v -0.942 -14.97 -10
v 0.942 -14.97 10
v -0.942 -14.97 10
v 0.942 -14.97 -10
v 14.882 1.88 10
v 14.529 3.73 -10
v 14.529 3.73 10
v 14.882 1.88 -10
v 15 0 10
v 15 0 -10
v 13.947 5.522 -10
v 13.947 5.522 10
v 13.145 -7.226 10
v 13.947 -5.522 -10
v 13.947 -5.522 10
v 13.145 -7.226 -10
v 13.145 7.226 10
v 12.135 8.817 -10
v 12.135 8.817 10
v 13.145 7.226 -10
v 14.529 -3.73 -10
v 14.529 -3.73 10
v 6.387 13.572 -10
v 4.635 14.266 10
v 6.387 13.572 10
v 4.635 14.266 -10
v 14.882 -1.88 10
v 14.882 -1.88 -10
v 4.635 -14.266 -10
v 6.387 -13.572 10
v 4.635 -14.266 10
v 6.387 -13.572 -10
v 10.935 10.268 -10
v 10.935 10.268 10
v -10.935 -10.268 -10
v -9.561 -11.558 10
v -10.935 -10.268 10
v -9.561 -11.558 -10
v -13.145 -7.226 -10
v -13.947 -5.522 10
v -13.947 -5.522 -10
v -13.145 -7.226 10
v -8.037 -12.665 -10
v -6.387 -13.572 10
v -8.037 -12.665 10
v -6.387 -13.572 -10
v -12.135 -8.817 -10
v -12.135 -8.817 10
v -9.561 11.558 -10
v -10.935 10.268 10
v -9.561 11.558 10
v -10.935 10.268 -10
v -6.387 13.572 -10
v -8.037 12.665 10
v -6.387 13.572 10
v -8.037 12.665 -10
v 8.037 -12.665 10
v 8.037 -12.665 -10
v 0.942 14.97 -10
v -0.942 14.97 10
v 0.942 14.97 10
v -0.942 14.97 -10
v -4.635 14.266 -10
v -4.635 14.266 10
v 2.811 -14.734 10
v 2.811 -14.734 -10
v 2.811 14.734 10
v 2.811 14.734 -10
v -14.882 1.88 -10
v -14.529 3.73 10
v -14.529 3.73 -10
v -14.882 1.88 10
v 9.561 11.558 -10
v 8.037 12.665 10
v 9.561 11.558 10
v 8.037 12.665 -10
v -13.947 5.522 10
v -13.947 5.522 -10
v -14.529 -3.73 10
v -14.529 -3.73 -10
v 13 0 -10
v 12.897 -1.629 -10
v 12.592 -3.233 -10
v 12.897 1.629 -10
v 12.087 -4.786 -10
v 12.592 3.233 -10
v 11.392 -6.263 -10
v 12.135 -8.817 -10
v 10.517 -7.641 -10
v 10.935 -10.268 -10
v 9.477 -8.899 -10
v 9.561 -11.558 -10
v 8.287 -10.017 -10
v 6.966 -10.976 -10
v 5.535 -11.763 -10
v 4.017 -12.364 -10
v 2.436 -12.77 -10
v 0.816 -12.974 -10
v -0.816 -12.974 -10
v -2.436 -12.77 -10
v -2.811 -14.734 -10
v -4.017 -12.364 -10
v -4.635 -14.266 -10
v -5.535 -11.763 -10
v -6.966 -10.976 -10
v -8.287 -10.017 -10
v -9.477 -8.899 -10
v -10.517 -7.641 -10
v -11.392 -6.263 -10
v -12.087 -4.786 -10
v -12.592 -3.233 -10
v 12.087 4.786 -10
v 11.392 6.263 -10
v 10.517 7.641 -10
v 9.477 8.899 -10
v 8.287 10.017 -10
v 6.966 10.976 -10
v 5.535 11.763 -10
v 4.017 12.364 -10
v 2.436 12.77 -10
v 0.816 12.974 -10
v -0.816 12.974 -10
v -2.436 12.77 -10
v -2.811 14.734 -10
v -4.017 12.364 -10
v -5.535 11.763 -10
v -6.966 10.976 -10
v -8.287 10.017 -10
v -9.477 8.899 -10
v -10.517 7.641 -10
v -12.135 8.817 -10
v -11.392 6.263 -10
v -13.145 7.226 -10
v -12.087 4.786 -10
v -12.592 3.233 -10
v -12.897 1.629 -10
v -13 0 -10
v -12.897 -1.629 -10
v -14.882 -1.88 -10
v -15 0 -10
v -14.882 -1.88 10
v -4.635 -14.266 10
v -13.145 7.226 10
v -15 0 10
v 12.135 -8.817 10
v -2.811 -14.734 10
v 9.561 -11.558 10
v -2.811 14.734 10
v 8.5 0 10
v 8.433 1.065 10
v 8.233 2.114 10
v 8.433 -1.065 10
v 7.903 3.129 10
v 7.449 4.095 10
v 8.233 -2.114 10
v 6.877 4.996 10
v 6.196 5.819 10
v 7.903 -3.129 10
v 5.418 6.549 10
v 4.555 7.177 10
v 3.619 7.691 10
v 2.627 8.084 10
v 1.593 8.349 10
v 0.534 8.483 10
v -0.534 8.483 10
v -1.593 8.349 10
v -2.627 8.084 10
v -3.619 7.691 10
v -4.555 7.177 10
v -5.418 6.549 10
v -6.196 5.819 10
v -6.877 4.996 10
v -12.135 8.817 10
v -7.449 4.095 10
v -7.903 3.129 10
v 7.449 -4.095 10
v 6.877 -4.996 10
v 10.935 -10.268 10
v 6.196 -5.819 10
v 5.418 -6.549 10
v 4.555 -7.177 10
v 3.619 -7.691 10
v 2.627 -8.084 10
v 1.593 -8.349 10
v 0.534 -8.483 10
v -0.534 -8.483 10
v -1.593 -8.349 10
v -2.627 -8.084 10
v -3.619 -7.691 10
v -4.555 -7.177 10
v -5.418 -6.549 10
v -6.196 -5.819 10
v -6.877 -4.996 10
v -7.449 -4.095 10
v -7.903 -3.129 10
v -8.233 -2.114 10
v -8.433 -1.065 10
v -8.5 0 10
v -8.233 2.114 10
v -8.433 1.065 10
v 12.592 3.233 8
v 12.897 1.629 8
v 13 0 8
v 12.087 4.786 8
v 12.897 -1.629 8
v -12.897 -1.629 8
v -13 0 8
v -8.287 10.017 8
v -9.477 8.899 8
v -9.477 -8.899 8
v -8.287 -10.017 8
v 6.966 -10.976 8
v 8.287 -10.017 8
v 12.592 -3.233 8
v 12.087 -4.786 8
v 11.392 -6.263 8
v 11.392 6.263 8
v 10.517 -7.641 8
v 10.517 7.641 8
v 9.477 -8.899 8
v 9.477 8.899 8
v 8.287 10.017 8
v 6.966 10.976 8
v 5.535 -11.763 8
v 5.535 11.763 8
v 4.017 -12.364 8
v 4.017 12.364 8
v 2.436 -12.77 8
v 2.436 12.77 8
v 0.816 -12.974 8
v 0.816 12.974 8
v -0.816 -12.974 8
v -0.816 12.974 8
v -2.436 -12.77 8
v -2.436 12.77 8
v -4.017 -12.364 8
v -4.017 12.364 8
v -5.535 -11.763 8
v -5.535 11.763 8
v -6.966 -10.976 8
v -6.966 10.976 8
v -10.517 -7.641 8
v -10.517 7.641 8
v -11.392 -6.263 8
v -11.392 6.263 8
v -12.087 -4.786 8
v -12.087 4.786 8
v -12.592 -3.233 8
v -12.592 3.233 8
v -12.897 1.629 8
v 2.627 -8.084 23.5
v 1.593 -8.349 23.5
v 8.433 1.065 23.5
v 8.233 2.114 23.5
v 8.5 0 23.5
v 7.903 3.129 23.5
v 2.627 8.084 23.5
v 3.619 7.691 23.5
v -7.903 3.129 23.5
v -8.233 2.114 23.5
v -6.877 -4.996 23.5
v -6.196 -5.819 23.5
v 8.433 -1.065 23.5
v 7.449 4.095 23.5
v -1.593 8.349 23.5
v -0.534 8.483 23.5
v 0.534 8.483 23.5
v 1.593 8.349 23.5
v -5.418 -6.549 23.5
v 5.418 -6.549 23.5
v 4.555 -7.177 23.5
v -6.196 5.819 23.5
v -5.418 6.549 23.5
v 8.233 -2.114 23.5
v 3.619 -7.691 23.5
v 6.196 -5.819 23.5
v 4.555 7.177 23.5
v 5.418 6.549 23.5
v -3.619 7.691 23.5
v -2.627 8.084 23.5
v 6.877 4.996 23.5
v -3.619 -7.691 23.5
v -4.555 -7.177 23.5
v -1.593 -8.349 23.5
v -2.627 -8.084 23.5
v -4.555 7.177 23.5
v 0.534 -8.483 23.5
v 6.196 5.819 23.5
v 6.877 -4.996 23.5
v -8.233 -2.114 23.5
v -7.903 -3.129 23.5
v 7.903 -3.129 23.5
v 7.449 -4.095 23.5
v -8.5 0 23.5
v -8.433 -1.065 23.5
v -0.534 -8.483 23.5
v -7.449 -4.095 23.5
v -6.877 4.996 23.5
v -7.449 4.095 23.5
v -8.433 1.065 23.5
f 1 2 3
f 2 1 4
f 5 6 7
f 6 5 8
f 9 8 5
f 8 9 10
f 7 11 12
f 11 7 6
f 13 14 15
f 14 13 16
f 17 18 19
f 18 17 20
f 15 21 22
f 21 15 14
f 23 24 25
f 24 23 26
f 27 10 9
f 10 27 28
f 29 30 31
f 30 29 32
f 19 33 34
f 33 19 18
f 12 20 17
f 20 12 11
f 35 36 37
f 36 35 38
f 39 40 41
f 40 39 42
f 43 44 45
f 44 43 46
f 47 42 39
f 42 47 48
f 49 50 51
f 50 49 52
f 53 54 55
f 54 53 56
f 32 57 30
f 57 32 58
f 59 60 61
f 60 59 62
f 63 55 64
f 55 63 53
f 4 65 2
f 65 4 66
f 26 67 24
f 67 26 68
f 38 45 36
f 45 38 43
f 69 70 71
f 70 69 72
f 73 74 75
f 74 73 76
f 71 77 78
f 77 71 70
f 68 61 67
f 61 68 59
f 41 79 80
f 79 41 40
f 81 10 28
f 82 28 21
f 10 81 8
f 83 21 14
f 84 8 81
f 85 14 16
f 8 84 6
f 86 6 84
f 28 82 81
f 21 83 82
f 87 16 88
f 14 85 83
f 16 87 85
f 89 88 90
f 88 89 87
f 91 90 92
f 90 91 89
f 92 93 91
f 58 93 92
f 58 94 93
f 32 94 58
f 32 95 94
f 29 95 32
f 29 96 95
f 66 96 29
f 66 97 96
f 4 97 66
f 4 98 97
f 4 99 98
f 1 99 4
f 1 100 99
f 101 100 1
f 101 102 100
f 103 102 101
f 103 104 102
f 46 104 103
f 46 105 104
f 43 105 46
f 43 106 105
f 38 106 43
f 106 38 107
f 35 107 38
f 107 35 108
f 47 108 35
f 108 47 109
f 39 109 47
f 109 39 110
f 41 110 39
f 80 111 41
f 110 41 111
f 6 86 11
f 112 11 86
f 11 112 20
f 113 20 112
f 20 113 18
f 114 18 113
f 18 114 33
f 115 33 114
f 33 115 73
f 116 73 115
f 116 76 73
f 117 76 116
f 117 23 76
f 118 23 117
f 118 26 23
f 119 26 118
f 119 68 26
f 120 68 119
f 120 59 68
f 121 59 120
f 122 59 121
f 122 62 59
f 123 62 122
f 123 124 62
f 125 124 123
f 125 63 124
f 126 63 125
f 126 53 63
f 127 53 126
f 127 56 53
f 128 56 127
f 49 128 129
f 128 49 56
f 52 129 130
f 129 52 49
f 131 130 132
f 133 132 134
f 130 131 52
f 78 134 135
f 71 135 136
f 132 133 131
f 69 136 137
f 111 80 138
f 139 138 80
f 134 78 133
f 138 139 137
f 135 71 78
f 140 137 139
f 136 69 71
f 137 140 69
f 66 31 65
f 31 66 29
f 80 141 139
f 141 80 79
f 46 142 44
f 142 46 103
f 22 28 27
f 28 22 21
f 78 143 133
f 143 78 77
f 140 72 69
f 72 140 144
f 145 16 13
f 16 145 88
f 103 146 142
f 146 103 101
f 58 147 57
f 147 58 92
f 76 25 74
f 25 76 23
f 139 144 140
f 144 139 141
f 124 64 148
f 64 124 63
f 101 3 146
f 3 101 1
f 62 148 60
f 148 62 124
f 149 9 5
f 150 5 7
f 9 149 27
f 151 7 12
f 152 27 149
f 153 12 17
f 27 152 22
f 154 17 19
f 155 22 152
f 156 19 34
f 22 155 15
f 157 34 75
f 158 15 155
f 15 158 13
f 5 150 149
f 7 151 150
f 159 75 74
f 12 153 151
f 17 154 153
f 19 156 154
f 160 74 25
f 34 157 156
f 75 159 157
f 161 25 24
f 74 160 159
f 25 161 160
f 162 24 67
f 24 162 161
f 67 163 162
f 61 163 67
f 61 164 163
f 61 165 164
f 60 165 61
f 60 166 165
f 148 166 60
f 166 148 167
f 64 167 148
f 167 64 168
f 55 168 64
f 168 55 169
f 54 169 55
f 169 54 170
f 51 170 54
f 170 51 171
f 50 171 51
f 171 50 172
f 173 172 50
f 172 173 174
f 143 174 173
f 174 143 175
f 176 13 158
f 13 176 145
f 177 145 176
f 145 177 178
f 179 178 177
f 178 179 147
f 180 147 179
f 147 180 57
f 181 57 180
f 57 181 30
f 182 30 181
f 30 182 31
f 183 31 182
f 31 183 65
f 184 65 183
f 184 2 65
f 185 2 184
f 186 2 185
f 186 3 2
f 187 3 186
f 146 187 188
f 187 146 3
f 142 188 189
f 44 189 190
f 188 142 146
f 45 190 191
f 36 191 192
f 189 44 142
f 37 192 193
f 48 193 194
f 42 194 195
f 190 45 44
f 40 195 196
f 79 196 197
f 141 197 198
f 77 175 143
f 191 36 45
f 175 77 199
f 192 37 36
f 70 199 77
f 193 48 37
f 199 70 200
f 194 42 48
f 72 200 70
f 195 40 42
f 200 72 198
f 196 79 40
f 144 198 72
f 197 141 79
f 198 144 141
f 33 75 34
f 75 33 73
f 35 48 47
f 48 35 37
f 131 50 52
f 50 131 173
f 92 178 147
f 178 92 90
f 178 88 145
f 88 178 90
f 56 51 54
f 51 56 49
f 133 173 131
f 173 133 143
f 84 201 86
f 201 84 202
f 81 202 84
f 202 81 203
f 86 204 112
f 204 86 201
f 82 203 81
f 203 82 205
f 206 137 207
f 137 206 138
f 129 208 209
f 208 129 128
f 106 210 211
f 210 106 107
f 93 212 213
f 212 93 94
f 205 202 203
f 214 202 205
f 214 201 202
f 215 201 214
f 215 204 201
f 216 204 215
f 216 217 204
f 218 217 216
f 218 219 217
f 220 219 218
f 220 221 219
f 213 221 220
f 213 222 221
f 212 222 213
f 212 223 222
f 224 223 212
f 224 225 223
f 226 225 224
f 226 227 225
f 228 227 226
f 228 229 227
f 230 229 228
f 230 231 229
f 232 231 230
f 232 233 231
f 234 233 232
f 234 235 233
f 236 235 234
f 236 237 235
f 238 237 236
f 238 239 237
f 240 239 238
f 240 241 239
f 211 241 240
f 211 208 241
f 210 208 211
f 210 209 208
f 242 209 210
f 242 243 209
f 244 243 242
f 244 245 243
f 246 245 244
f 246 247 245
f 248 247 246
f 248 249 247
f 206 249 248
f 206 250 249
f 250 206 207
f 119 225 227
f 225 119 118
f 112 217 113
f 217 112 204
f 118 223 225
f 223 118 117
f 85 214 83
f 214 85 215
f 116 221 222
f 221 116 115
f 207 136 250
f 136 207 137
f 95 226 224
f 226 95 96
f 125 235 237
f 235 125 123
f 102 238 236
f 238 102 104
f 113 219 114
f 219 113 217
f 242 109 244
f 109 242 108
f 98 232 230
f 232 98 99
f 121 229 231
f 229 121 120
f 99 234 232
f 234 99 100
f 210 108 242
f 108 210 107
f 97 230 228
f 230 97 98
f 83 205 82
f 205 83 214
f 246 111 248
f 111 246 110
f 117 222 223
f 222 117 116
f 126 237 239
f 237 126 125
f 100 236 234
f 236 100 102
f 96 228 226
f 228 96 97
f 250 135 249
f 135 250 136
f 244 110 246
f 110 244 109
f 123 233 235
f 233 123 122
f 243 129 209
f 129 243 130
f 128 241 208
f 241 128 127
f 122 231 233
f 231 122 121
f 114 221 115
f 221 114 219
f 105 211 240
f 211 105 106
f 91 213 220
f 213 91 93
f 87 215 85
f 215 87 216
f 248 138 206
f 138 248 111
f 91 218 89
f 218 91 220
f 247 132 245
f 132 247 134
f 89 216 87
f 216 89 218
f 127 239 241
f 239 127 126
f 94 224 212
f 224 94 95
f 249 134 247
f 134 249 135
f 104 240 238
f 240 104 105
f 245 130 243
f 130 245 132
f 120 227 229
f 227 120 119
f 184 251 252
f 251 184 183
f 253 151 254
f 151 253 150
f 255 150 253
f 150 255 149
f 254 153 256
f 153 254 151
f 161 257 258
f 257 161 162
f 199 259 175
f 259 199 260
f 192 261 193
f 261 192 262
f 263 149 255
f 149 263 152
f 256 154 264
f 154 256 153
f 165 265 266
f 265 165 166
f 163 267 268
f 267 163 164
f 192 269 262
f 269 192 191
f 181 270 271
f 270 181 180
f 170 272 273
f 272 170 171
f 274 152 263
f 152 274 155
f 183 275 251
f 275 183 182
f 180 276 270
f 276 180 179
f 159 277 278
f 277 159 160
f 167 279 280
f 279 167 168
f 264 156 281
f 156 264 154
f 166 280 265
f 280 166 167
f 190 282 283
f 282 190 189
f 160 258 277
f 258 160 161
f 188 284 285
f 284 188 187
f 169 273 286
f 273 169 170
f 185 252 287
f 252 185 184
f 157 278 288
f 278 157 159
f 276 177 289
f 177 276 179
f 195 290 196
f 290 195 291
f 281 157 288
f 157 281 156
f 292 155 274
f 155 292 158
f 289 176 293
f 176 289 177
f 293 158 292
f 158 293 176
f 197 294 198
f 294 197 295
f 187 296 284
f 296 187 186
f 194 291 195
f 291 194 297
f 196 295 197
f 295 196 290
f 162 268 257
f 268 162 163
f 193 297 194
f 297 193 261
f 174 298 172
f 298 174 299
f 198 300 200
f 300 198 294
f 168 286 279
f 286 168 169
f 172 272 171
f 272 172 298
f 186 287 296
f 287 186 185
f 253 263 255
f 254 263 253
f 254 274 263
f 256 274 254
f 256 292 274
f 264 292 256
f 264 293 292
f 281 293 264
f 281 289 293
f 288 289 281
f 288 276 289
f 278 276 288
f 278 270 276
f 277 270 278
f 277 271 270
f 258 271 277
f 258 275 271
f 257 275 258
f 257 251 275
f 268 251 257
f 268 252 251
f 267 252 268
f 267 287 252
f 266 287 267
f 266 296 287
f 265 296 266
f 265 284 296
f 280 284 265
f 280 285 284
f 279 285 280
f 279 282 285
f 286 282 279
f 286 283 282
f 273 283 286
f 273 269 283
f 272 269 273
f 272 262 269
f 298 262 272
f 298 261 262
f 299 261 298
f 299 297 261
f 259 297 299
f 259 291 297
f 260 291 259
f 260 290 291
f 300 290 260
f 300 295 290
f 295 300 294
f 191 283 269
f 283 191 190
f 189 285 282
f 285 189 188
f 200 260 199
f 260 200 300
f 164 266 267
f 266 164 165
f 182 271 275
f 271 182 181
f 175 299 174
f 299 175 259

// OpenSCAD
// Baumadapter

$fn=50;

difference() {
    cylinder(d=30,h=20, center=true);
    translate([0,0,-2])
    cylinder(d=26,h=20, center=true);

}
    translate([0,0,16])
    cylinder(d=17,h=15, center=true);
